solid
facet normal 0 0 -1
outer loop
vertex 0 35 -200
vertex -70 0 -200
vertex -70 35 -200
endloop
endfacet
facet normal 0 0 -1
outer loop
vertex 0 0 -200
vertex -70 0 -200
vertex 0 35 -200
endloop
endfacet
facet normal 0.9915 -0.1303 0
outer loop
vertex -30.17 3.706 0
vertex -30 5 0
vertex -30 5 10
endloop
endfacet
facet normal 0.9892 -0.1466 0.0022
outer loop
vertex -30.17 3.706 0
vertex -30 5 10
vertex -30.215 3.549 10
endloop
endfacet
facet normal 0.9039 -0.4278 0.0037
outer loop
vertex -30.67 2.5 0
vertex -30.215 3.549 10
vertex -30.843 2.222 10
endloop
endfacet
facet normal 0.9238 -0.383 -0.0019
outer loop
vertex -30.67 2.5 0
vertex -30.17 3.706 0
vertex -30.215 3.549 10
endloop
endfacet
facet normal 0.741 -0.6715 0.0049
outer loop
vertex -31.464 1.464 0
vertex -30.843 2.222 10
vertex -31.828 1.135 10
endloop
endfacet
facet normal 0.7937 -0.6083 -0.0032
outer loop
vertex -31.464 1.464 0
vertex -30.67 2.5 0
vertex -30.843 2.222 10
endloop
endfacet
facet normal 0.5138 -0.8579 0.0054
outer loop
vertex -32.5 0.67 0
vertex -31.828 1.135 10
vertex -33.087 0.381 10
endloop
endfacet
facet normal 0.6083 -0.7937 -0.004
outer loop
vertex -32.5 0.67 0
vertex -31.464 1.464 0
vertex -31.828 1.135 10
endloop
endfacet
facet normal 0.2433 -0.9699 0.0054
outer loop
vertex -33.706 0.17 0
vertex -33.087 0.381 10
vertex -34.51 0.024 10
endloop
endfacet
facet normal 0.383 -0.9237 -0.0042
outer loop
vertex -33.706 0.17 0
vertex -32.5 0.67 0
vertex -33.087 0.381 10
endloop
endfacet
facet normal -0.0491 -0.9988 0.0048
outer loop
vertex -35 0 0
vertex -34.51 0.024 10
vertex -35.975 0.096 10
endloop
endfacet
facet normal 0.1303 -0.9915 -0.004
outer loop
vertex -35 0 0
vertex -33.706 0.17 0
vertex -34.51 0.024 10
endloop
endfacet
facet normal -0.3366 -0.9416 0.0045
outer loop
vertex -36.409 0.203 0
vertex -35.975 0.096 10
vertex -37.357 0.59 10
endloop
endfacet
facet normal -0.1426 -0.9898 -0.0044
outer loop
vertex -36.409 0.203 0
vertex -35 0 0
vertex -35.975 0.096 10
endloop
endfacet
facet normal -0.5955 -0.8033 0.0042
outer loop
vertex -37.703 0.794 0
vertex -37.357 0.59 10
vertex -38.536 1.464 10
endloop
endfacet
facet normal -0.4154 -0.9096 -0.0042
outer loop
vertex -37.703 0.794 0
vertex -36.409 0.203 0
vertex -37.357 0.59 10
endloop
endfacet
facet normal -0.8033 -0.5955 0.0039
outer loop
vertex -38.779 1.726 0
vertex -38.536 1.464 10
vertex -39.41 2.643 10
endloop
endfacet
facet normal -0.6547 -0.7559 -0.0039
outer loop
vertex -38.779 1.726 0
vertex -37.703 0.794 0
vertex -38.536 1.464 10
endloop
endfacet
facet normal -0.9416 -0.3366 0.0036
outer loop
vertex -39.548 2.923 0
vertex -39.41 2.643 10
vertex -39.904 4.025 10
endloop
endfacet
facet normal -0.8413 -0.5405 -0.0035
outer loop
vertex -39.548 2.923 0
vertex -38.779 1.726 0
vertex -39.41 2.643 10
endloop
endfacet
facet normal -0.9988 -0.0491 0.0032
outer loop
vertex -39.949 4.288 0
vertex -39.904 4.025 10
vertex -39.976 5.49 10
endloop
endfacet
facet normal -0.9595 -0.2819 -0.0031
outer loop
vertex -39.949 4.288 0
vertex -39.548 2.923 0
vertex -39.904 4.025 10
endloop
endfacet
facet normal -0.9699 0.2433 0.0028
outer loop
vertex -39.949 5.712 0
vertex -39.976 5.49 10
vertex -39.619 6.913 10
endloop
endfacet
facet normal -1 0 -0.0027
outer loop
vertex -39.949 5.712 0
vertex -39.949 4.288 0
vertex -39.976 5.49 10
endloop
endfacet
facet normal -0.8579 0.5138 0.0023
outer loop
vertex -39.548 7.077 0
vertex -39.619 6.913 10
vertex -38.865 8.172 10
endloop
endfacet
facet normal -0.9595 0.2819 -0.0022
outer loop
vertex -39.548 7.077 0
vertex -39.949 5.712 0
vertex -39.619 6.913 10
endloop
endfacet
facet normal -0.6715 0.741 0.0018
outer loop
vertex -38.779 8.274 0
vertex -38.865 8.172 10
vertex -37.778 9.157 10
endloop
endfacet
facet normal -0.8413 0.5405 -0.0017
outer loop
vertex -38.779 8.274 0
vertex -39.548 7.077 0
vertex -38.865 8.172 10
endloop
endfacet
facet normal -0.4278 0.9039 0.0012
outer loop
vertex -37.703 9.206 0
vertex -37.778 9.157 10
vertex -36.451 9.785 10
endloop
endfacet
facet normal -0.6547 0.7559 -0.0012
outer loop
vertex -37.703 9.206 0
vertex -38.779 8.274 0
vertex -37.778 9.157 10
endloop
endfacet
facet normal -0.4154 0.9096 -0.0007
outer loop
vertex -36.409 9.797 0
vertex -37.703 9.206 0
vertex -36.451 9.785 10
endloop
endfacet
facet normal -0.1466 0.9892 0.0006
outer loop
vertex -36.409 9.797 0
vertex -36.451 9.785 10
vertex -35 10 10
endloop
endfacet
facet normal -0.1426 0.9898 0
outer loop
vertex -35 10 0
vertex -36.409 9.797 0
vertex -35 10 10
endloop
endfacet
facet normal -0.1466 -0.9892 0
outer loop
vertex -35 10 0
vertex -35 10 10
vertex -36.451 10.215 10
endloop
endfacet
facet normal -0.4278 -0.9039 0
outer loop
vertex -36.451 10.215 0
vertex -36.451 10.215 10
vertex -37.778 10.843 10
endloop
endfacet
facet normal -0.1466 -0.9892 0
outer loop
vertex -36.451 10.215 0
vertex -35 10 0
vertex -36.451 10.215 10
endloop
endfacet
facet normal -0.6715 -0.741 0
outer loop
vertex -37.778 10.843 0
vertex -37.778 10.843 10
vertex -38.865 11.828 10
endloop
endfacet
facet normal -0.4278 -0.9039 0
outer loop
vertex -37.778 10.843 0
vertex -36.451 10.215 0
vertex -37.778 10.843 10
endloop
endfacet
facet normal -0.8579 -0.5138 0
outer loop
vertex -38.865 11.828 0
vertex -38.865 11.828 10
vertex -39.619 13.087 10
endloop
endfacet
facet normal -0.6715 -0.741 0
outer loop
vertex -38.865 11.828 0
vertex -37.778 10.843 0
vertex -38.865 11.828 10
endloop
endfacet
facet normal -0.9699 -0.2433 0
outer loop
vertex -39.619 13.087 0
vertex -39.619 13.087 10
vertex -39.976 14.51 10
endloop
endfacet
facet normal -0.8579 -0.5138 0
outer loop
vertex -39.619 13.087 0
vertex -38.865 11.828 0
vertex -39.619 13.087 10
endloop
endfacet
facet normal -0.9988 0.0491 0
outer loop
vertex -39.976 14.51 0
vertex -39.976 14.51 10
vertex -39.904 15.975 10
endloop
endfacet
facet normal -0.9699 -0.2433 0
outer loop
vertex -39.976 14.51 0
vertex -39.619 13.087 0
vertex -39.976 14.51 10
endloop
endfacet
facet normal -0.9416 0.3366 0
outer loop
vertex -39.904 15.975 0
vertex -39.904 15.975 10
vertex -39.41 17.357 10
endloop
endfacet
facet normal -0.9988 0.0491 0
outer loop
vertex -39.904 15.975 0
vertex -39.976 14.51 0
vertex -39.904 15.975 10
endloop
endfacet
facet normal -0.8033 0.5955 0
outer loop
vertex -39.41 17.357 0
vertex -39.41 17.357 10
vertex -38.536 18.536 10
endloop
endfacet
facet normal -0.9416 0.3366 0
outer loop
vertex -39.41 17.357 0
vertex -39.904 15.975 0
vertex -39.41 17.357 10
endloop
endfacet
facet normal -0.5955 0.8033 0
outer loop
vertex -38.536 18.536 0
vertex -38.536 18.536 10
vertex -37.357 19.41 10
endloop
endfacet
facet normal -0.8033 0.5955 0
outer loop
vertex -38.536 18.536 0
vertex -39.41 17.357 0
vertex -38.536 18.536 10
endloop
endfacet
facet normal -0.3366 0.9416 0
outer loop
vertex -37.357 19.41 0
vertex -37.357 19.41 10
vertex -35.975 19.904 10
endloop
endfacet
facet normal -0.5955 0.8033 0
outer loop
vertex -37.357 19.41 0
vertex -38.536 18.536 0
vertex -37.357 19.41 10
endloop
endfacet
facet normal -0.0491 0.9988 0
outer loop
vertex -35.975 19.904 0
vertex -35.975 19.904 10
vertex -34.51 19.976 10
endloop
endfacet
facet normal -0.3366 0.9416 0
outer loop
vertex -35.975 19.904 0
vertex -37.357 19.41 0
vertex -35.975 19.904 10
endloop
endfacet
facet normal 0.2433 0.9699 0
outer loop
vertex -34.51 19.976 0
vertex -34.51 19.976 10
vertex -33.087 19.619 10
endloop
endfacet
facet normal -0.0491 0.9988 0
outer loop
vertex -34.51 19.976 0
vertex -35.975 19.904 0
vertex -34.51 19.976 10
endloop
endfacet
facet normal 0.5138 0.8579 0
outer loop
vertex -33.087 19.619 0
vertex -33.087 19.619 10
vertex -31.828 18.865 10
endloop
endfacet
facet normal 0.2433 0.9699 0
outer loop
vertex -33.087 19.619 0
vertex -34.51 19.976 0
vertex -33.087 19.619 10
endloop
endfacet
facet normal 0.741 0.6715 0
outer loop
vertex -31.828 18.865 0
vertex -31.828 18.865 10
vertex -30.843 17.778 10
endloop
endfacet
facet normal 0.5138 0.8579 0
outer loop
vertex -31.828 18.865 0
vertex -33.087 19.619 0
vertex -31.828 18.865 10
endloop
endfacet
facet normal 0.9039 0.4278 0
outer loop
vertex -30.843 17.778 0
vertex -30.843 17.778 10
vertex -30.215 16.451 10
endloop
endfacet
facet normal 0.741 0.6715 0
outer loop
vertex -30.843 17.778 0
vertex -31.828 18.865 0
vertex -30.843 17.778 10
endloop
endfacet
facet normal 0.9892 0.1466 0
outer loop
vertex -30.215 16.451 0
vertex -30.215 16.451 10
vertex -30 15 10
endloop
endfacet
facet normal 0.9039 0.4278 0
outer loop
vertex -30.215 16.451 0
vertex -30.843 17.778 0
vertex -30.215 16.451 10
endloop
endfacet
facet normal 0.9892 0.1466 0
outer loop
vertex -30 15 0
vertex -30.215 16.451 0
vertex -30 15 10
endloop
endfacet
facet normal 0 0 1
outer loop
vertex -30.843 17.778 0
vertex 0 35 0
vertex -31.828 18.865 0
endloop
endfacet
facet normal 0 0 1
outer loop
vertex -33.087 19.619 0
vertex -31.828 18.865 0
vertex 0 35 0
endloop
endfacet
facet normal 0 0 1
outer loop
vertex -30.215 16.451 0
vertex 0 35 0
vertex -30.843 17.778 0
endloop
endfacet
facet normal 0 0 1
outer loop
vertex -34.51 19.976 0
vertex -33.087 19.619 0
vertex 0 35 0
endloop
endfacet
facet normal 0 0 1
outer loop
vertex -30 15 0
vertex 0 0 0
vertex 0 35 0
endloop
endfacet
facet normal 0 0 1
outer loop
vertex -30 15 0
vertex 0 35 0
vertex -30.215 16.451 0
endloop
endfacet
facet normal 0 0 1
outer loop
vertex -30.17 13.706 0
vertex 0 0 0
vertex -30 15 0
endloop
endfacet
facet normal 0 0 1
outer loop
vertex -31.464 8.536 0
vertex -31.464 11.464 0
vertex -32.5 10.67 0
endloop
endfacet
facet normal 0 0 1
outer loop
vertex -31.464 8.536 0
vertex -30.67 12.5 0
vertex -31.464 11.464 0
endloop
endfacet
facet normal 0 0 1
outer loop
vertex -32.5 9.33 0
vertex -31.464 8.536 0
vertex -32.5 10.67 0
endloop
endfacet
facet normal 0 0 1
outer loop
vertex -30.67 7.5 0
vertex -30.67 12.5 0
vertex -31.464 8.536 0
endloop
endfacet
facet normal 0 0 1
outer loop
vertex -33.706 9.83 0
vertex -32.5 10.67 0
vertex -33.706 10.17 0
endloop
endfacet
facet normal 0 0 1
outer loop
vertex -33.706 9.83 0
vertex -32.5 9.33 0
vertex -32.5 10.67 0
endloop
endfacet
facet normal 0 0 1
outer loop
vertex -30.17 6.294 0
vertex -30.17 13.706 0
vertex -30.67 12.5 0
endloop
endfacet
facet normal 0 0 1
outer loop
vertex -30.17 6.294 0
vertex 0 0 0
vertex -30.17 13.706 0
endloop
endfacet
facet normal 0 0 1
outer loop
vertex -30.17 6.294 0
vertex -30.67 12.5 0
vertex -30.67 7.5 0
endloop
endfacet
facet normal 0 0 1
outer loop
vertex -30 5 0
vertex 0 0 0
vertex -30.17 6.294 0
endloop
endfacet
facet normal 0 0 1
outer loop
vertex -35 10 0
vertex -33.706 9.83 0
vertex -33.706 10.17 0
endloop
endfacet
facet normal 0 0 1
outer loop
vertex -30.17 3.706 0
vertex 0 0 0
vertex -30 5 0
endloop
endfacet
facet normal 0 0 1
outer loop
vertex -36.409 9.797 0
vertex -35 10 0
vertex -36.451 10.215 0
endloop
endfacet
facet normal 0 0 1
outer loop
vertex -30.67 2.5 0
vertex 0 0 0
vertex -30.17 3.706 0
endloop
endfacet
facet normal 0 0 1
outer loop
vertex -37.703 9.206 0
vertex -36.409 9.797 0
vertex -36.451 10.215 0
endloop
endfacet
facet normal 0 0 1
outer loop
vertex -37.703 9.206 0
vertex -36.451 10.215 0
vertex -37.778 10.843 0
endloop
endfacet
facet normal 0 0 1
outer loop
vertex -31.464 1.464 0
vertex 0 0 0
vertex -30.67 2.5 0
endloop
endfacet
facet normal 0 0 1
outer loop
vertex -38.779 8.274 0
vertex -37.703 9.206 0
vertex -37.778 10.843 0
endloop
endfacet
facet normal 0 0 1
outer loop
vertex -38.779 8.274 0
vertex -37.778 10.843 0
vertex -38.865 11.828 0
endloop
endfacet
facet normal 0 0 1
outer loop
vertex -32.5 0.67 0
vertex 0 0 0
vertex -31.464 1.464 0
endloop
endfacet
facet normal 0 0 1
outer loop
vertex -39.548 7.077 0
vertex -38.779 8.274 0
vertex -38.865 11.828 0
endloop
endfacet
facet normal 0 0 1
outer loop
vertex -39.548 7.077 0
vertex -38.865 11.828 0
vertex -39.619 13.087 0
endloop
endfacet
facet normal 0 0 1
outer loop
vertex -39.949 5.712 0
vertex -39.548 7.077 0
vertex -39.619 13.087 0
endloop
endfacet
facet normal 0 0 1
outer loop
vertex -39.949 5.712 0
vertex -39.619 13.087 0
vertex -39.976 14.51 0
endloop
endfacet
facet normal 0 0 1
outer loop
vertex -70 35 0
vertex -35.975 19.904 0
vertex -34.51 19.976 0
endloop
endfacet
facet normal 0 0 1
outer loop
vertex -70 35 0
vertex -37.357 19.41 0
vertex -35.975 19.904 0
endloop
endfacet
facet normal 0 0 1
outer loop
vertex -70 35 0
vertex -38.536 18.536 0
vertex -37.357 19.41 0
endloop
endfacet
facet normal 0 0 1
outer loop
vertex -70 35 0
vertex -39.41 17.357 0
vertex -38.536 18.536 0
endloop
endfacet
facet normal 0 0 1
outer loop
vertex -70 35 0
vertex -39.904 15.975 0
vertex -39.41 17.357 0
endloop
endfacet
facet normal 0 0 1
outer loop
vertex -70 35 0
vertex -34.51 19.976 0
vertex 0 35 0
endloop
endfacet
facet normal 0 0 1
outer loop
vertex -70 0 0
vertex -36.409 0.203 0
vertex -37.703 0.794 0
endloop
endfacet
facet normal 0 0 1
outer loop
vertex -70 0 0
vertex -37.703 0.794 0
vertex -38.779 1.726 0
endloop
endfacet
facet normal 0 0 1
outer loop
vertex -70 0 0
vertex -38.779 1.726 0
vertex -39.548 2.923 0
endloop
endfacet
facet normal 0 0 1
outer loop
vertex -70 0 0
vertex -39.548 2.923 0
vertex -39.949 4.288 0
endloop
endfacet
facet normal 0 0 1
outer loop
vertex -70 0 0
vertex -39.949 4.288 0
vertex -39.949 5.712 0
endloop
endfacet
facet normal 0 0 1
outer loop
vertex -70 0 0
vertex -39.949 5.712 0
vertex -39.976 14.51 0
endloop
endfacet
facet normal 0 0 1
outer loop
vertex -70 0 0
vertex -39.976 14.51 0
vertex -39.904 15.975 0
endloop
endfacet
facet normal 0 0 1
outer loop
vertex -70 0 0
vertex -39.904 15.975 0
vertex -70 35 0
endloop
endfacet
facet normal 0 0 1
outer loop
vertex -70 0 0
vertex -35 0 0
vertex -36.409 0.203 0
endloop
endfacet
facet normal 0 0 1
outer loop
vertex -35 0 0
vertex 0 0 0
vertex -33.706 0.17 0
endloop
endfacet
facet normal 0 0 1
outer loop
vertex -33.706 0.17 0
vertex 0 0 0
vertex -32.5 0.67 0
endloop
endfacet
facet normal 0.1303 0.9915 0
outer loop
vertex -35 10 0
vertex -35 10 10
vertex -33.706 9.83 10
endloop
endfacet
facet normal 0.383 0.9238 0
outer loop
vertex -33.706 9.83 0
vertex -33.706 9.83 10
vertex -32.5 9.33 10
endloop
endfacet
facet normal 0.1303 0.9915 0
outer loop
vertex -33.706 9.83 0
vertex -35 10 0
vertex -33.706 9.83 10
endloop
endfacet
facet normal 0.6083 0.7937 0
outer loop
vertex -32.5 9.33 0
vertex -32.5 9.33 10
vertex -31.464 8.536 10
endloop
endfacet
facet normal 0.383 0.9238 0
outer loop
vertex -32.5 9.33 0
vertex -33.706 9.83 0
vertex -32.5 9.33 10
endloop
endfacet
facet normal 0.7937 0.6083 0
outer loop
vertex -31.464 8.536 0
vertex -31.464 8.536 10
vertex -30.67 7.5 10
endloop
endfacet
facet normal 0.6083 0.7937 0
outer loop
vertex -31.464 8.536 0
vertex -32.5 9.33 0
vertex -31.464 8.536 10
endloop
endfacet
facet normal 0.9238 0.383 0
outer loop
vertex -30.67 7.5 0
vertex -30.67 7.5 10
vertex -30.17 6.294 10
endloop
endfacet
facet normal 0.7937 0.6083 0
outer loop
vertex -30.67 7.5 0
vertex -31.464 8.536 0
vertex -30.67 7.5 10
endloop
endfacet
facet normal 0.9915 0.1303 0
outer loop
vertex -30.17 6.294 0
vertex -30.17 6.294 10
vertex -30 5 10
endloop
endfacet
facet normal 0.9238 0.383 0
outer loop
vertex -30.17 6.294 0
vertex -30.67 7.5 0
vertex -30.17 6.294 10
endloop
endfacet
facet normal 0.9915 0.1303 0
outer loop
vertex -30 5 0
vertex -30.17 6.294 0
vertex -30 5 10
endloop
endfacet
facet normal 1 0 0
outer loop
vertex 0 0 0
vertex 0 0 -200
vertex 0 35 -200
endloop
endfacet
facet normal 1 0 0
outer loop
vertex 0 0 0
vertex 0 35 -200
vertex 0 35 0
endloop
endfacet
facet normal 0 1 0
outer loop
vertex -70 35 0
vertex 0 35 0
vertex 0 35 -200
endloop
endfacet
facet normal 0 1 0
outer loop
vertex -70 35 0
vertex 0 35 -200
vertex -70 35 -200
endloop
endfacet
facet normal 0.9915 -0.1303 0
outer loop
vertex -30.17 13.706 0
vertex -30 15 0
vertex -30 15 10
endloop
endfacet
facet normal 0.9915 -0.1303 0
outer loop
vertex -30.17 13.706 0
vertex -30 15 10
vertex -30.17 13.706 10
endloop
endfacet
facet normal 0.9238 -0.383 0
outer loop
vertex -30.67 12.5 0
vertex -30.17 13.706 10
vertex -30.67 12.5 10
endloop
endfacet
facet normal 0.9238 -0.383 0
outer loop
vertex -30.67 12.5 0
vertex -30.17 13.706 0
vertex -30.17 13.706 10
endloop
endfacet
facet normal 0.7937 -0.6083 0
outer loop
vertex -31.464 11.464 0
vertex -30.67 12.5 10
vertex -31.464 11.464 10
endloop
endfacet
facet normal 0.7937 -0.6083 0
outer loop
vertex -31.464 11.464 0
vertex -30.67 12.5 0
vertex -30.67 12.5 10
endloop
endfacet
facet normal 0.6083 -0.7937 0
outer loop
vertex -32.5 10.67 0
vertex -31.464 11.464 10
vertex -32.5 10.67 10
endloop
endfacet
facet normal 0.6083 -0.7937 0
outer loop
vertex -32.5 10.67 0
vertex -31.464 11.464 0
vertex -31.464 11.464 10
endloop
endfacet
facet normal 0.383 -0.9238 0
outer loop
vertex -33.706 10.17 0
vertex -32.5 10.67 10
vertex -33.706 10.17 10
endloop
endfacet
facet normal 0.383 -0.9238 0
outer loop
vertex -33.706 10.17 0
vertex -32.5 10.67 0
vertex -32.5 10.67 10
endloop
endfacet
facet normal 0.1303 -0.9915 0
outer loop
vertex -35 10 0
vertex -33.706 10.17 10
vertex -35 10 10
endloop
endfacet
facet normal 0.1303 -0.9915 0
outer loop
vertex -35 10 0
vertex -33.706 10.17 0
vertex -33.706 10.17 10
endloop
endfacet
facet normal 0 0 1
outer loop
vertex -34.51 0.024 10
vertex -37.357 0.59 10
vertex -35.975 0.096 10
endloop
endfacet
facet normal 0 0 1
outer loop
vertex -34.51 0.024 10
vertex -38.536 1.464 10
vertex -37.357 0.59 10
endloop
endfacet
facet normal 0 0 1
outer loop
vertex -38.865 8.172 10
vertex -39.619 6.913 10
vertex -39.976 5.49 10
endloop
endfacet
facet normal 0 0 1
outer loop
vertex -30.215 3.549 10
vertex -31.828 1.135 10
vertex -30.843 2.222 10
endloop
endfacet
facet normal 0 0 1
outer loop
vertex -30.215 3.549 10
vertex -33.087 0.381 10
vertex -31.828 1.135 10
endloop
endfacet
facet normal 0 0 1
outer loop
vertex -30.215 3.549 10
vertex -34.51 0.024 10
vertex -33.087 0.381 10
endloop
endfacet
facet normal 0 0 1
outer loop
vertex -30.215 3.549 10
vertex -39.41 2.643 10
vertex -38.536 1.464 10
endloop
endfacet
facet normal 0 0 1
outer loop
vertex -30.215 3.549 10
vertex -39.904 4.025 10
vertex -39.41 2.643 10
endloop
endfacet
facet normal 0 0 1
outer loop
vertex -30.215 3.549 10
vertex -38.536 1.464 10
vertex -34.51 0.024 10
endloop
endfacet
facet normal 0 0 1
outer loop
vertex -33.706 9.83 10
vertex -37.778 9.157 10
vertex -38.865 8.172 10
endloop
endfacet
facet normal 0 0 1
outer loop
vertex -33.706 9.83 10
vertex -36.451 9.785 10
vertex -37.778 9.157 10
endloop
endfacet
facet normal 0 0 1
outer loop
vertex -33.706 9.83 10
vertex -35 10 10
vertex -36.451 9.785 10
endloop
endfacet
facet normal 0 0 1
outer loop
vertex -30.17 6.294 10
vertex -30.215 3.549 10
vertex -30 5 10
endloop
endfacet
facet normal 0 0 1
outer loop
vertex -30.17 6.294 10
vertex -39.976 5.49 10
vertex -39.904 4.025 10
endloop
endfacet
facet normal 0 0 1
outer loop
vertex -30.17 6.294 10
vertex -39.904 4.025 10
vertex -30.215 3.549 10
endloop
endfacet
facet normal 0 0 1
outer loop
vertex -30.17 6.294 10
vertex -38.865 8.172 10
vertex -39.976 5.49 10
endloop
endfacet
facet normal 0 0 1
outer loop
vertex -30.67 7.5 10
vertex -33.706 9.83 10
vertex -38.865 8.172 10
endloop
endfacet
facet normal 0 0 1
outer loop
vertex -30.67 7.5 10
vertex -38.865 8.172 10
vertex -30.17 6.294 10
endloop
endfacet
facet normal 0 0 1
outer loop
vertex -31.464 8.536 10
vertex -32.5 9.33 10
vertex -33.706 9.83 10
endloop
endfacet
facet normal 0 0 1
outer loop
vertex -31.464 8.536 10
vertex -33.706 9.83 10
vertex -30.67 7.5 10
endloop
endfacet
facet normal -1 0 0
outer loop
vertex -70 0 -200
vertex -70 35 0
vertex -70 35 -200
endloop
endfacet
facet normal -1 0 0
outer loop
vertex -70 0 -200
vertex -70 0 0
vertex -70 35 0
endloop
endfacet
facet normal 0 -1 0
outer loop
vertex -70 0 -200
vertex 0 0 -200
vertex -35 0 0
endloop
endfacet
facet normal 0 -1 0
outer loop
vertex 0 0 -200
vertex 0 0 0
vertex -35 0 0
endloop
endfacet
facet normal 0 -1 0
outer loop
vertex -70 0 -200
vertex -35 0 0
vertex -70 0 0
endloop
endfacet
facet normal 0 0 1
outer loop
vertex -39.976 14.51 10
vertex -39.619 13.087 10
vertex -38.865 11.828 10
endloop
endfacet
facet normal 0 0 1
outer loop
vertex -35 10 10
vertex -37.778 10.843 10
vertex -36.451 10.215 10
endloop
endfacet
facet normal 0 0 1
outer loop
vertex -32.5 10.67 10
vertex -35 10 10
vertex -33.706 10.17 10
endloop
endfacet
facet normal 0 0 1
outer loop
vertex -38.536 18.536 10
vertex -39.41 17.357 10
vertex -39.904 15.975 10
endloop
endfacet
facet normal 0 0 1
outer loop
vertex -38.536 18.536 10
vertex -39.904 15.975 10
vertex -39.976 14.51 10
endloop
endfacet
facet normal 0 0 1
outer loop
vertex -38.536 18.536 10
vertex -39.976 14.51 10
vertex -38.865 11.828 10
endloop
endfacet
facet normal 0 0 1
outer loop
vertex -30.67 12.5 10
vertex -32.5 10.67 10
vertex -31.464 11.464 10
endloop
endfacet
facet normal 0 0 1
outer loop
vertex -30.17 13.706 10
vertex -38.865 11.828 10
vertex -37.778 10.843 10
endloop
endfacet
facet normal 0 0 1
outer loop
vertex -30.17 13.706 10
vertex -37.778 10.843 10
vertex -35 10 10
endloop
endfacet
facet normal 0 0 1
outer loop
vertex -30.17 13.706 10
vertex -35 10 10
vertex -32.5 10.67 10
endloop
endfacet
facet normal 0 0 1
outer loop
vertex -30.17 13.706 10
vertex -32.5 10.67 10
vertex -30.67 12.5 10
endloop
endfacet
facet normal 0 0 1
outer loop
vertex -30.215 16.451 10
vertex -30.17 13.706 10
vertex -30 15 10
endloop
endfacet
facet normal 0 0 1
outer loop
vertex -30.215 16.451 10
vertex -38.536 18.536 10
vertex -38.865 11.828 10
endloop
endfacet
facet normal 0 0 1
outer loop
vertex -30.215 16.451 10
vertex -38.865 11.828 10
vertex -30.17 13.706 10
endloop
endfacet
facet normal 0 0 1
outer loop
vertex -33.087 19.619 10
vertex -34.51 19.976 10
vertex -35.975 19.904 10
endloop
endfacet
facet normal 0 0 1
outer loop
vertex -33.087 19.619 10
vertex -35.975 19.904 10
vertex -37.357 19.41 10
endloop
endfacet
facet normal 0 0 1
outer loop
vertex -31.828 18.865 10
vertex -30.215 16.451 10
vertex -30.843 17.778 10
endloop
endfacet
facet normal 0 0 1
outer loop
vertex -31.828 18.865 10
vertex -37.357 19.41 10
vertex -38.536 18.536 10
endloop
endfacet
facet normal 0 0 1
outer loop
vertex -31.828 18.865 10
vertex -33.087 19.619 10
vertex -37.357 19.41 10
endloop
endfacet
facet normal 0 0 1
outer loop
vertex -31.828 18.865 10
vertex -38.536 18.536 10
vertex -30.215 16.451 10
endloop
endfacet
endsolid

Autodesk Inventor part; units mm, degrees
ref_plane "YZ Plane" through (0, 0, 0) normal (1, 0, 0) x (0, 1, 0)
ref_plane "XZ Plane" through (0, 0, 0) normal (0, 1, 0) x (-1, 0, 0)
ref_plane "XY Plane" through (0, 0, 0) normal (0, 0, 1) x (1, 0, 0)
sketch "Sketch1" plane through (0, 0, 0) normal (0, 1, 0) x (-1, 0, 0)
  line L0 (0, 0) -> (70, 0)
  line L1 (70, 0) -> (70, -200)
  line L2 (70, -200) -> (0, -200)
  line L3 (0, -200) -> (0, 0)
  dimension "d0" = 70
  dimension "d1" = 200
extrude "Extrusion1" add sketch "Sketch1" along normal blind 35
sketch "Sketch2" plane through (-70, 0, 0) normal (0, 0, 1) x (1, 0, 0)
  point P0 (70, 0)
sketch "Sketch3" plane through (-70, 0, 0) normal (0, 0, 1) x (1, 0, 0)
  circle A0 centre (35, 5) radius 5
  circle A1 centre (35, 15) radius 5
  line L0 (70, 0) -> (70, 35) projected
  line L1 (0, 0) -> (70, 0) projected
  point P0 (70, 17.5)
  dimension "d4" = 10
  dimension "d5" = 10
  dimension "d6" = 35
  dimension "d7" = 35
  dimension "d8" = 10
  dimension "d9" = 5
extrude "Extrusion2" add sketch "Sketch3" along normal blind 10 contours A0
sketch "Sketch4" plane through (-70, 35, 0) normal (0, 0, 1) x (1, 0, 0)
  circle A0 centre (35, -20) radius 5
  line L0 (35, -35) -> (70, -35) projected
  line L1 (70, -35) -> (70, 0) projected
  dimension "d12" = 10
  dimension "d13" = 15
  dimension "d14" = 35
extrude "Extrusion3" add sketch "Sketch4" along normal blind 10
properties part number "water tank mm"
